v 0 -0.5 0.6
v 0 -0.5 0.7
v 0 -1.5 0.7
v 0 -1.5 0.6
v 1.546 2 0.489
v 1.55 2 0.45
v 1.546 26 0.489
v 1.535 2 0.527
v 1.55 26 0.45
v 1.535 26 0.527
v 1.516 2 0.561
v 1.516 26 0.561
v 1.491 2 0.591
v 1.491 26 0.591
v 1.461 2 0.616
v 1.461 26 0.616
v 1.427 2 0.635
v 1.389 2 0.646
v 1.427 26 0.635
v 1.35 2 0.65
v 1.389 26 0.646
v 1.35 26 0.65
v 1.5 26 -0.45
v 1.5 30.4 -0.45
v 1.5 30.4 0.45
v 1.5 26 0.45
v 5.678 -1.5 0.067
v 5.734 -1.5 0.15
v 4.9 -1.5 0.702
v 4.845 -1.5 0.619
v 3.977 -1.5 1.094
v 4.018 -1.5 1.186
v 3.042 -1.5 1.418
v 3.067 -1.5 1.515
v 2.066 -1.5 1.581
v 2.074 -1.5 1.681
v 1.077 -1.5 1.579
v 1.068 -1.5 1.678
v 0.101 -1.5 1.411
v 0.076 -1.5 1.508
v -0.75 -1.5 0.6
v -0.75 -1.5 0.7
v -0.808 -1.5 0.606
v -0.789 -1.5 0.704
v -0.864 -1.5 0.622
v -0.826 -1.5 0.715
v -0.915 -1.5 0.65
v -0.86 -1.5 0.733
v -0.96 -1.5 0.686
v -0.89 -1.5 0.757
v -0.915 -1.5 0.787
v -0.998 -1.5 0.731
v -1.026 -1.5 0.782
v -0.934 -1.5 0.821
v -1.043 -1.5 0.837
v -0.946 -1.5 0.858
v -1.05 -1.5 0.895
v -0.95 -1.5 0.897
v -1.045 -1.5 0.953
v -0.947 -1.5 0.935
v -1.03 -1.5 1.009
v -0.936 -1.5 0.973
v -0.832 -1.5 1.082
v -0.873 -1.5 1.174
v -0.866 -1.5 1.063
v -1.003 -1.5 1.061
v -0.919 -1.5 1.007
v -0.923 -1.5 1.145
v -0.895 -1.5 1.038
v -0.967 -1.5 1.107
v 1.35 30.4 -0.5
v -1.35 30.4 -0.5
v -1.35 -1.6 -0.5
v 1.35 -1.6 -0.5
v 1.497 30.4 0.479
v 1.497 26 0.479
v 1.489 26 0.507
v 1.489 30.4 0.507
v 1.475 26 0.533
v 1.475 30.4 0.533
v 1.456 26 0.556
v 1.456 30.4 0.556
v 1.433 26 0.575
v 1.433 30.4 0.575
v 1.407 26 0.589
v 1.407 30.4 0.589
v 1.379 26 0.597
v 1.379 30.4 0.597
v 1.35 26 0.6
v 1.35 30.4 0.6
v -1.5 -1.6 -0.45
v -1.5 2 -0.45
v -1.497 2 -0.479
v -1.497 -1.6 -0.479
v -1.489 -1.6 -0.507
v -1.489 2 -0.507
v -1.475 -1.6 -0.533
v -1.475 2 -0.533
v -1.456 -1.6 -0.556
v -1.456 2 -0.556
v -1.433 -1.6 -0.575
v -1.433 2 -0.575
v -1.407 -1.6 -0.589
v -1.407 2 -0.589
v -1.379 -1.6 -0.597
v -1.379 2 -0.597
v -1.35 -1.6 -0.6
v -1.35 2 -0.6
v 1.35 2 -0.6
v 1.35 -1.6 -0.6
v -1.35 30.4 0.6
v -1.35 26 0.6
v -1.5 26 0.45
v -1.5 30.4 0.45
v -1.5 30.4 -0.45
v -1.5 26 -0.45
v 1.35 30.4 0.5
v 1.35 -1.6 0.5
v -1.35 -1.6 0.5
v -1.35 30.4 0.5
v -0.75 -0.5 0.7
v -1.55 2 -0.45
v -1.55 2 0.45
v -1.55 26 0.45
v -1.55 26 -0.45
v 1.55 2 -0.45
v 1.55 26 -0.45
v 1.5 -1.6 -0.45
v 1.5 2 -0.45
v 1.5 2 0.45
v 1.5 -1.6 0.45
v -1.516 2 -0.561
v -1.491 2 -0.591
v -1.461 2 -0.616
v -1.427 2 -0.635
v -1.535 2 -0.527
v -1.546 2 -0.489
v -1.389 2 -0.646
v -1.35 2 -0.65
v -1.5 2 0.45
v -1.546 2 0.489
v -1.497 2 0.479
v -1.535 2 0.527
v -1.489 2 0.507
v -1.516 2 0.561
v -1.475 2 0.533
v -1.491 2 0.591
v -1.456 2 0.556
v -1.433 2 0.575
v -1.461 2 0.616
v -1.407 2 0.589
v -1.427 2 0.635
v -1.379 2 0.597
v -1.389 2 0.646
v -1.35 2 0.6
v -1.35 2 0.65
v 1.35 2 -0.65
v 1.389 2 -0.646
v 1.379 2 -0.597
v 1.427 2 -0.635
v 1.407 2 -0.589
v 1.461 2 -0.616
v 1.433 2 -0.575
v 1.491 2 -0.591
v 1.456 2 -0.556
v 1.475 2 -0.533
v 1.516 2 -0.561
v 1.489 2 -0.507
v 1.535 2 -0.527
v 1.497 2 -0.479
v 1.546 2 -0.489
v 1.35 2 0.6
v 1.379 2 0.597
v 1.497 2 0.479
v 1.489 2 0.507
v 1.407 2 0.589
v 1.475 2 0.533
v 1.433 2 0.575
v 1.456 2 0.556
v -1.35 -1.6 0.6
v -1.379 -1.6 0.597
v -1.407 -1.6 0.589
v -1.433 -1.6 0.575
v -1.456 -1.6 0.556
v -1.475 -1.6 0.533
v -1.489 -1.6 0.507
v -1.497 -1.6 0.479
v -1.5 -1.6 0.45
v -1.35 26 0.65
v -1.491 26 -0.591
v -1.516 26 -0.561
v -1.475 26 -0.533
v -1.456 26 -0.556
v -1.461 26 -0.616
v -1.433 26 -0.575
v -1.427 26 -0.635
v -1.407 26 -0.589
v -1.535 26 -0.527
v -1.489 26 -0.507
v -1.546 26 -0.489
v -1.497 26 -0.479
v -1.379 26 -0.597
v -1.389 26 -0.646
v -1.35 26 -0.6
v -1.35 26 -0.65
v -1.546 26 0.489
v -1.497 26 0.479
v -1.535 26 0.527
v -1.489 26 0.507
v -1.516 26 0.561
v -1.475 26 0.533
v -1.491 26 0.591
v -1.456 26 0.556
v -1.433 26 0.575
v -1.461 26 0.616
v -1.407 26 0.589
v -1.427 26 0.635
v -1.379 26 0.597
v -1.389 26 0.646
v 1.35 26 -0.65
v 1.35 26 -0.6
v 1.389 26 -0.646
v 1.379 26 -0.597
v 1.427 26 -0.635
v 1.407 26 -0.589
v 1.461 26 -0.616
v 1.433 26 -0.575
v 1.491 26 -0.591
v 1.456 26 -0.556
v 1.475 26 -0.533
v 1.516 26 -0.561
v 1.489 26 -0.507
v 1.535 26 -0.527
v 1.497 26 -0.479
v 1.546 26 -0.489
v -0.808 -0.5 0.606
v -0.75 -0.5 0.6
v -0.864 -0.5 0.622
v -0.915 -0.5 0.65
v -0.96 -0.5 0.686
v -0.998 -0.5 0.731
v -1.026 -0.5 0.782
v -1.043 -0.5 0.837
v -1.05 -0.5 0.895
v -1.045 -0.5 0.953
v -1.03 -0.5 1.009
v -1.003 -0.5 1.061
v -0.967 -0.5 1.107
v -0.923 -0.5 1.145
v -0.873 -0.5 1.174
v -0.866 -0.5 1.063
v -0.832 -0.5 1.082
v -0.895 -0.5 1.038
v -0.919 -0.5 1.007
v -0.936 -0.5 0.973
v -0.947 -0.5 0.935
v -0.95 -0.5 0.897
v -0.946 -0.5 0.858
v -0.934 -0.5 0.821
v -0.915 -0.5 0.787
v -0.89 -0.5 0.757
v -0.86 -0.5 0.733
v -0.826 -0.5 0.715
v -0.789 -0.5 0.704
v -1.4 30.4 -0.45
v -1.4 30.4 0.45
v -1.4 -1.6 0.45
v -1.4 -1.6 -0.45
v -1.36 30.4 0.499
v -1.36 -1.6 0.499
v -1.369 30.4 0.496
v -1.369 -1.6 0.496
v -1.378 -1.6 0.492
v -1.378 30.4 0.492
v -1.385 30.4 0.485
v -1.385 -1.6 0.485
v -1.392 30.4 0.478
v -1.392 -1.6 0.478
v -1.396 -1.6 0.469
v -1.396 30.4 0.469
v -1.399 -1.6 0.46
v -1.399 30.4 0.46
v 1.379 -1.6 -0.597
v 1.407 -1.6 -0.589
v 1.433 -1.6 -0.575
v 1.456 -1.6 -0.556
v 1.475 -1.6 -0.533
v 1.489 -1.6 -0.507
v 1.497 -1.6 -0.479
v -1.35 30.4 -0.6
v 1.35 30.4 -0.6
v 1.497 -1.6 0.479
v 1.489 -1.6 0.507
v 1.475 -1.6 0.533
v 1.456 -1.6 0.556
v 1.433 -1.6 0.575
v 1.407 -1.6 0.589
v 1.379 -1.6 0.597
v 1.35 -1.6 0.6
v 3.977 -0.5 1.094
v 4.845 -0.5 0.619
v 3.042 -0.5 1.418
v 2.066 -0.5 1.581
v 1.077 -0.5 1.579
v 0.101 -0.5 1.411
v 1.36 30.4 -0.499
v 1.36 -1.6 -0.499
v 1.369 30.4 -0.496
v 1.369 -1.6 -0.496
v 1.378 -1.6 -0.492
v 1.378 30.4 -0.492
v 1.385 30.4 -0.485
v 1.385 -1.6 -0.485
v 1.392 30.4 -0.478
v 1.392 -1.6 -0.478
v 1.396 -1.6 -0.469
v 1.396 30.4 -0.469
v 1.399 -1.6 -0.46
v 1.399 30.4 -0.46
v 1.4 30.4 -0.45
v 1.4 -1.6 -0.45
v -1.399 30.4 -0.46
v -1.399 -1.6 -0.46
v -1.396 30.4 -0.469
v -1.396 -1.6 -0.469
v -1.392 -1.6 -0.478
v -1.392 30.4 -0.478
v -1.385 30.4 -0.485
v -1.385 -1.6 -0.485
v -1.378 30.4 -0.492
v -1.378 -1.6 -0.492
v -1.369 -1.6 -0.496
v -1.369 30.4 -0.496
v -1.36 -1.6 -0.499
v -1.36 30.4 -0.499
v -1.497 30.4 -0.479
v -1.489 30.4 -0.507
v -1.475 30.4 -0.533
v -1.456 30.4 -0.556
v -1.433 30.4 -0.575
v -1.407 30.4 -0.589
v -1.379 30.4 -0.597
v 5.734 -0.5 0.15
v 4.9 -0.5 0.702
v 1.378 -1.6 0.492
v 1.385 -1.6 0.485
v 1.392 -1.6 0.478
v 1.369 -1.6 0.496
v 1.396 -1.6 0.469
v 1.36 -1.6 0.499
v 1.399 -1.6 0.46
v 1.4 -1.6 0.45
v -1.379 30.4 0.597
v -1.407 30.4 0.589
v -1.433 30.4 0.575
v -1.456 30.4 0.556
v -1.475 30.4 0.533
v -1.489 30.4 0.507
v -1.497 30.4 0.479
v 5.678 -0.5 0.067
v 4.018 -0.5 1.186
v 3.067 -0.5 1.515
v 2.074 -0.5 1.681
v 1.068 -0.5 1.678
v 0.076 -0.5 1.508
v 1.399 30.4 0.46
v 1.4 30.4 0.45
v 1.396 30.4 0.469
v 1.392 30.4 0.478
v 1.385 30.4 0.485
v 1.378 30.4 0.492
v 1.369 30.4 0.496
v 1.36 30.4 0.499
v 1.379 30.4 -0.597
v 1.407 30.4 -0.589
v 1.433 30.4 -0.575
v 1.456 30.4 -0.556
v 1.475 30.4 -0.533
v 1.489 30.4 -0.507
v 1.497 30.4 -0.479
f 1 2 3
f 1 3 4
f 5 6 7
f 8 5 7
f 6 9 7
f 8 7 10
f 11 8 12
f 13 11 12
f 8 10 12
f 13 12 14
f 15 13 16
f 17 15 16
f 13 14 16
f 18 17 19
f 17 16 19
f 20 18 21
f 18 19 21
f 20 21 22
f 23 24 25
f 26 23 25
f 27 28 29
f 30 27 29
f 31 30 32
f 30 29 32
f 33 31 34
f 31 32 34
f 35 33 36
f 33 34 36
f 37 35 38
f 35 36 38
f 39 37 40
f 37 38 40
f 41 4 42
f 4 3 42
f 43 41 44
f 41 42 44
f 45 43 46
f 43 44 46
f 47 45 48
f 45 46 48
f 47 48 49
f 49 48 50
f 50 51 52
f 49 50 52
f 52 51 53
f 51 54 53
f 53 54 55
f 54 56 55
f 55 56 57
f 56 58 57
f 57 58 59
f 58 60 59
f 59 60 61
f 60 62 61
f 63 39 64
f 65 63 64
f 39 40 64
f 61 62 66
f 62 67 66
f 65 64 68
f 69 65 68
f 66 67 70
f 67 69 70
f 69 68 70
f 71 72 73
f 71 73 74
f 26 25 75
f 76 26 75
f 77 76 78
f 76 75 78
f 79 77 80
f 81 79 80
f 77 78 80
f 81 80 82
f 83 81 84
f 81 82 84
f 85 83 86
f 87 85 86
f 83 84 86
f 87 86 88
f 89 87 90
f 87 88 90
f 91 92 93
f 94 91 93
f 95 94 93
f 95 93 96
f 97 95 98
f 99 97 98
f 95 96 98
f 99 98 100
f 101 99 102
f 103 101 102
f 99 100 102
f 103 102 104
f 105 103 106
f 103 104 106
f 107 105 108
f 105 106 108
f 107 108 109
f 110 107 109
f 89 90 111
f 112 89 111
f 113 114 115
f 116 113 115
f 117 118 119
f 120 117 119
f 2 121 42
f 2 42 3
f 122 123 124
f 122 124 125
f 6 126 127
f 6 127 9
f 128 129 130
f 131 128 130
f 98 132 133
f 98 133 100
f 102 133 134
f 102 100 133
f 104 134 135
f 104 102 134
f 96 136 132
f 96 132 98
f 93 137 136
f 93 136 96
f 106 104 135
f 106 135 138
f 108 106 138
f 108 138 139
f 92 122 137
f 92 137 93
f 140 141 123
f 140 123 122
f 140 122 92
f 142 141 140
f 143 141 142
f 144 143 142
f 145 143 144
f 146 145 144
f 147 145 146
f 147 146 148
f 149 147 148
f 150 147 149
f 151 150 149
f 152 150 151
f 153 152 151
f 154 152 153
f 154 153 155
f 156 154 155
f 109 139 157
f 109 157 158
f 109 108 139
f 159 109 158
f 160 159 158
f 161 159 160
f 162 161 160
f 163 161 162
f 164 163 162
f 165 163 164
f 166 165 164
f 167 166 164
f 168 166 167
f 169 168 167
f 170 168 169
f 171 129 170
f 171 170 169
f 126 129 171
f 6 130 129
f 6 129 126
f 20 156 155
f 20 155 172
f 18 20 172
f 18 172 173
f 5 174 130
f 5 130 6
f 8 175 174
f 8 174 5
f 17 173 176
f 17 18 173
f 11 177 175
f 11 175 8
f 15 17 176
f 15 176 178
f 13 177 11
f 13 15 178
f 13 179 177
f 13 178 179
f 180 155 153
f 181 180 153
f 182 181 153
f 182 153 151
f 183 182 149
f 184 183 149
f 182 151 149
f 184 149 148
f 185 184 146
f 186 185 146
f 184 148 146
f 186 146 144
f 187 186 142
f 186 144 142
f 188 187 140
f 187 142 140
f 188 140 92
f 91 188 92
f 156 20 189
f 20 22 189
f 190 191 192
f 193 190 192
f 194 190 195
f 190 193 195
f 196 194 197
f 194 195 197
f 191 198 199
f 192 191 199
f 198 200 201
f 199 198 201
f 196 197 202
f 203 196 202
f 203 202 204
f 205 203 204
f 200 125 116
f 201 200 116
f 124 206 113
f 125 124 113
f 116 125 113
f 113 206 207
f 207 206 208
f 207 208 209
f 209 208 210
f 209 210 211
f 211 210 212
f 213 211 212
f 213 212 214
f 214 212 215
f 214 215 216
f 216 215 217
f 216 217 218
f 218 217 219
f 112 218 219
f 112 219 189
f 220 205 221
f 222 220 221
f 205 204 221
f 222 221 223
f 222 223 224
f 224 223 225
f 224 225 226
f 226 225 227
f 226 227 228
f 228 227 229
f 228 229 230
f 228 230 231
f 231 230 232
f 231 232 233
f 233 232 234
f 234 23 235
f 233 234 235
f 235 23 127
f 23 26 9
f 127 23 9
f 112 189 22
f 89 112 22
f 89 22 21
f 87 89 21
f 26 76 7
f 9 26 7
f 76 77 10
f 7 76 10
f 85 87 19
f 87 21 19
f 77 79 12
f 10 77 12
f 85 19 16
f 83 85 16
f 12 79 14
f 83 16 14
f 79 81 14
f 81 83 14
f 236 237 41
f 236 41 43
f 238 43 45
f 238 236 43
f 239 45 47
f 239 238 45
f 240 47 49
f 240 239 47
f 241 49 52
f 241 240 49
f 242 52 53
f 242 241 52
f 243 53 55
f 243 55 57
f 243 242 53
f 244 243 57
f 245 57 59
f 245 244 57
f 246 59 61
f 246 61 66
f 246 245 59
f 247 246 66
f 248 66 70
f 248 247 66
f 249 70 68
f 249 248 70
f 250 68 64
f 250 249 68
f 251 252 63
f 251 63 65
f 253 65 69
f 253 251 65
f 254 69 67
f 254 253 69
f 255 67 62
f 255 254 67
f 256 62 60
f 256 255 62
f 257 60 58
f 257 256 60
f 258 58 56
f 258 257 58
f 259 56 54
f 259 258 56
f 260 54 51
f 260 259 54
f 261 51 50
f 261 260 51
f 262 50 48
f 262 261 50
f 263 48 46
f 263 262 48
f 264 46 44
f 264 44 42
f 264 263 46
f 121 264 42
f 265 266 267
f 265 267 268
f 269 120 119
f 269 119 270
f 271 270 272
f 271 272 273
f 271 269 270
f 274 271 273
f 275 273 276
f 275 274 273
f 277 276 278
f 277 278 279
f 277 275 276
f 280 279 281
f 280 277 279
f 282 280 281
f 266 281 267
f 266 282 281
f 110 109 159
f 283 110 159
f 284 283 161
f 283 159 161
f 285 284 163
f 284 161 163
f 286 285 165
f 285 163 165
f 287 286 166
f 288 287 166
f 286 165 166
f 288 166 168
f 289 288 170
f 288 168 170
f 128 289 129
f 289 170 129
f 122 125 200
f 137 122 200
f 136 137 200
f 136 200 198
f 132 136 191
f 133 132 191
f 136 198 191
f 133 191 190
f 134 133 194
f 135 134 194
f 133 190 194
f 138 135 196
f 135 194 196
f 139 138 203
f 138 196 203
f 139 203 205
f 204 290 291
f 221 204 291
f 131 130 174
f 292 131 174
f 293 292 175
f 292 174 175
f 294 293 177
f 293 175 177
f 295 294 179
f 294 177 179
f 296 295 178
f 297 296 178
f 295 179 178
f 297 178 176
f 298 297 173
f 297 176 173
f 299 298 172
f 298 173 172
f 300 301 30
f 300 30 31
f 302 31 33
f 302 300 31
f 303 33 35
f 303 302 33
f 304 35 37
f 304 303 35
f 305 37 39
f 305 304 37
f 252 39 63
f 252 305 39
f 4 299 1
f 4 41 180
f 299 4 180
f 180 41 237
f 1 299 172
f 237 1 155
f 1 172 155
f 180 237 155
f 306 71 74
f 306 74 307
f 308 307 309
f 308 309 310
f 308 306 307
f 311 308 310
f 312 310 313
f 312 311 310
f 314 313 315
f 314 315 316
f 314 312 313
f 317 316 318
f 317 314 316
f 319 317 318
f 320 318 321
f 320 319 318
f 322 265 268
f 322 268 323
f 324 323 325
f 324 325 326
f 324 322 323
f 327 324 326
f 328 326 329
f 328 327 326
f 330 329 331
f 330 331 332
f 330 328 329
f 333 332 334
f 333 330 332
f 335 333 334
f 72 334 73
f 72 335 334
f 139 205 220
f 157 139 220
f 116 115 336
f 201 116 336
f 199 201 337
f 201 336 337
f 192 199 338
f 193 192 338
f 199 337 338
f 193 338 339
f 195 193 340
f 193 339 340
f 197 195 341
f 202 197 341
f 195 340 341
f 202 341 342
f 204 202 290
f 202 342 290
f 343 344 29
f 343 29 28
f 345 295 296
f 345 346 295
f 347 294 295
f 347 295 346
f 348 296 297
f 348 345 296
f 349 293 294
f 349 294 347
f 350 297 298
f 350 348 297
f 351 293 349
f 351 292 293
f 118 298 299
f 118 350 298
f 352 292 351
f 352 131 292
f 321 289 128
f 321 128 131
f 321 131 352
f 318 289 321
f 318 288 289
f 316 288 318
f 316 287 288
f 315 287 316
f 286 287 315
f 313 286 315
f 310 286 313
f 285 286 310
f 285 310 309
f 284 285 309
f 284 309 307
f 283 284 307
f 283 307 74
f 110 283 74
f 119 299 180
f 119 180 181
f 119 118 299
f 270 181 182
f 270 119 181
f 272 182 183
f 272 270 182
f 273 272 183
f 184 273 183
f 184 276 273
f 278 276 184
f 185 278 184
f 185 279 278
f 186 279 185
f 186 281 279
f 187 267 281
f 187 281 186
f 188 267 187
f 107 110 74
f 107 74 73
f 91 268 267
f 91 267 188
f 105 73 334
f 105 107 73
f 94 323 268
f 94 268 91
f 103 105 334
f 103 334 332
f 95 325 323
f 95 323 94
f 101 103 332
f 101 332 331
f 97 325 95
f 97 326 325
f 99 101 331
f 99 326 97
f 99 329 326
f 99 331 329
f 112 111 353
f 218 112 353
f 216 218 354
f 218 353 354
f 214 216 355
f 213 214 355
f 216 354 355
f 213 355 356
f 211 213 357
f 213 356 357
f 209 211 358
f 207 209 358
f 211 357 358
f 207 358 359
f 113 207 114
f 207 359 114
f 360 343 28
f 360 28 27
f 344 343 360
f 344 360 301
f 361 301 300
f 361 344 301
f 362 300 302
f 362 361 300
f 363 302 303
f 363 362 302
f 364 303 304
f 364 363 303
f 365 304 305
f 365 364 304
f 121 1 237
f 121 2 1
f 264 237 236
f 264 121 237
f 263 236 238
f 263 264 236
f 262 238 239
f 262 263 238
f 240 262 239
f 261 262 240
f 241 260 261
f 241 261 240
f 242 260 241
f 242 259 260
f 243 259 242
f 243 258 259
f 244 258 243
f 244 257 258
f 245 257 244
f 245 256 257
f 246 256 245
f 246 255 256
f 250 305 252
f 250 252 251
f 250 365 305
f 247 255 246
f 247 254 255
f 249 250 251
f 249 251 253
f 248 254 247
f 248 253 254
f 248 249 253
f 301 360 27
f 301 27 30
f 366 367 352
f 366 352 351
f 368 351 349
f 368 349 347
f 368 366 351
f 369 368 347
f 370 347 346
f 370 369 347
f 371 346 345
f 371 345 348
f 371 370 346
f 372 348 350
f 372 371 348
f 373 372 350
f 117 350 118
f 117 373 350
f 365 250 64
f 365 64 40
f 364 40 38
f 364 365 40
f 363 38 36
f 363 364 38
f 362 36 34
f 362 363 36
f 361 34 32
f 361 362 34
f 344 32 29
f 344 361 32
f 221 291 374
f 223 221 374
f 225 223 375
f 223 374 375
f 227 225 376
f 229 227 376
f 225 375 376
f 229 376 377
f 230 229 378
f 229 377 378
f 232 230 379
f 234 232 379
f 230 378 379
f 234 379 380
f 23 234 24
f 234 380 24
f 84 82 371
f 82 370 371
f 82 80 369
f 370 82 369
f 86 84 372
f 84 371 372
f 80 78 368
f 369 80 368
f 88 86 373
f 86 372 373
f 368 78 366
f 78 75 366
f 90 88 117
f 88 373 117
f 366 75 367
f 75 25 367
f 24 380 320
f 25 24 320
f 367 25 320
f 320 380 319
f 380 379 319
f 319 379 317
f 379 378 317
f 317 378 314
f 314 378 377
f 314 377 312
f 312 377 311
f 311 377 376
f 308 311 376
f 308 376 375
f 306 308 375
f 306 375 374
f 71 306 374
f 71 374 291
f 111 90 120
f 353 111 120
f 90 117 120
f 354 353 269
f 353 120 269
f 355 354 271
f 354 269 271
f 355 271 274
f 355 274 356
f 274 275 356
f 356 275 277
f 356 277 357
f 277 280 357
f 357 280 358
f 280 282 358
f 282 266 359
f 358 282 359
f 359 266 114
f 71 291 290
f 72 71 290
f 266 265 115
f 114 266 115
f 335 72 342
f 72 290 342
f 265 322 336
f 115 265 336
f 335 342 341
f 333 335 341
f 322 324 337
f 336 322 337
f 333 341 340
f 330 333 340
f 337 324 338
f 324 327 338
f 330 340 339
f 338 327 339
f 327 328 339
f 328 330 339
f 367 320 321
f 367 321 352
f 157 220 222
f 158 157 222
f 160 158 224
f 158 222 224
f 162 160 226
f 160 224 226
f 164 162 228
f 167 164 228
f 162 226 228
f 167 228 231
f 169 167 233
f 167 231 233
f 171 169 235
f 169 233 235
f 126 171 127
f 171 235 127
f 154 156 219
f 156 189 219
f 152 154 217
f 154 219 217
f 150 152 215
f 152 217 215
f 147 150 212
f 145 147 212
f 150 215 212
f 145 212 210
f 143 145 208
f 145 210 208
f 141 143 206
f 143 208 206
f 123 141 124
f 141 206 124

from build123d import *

# Parameters (mm, degrees)
EXTRUDE_THIN1_DEPTH      = 30.4
EXTRUDE_THIN1_DEPTH_BACK = 1.6
EXTRUDE_THIN2_DEPTH      = 12
EXTRUDE_THIN3_DEPTH      = 1


with BuildPart() as part:
    # Sketch1 → Extrude-Thin1 (new body, two sides)
    with BuildSketch(Plane(origin=(0, 0, 0), x_dir=(1, 0, 0), z_dir=(0, 1, 0))) as extrude_thin1_sk:
        with BuildLine():
            Line((1.35, -0.6), (-1.35, -0.6))
            ThreePointArc((-1.35, -0.6), (-1.456066017, -0.556066017), (-1.5, -0.45))
            Line((-1.5, -0.45), (-1.5, 0.45))
            ThreePointArc((-1.5, 0.45), (-1.456066017, 0.556066017), (-1.35, 0.6))
            Line((-1.35, 0.6), (1.35, 0.6))
            ThreePointArc((1.35, 0.6), (1.456066017, 0.556066017), (1.5, 0.45))
            Line((1.5, 0.45), (1.5, -0.45))
            ThreePointArc((1.5, -0.45), (1.456066017, -0.556066017), (1.35, -0.6))
        make_face()
        with BuildLine():
            Line((1.35, -0.5), (-1.35, -0.5))
            ThreePointArc((-1.35, -0.5), (-1.385355339, -0.485355339), (-1.4, -0.45))
            Line((-1.4, -0.45), (-1.4, 0.45))
            ThreePointArc((-1.4, 0.45), (-1.385355339, 0.485355339), (-1.35, 0.5))
            Line((-1.35, 0.5), (1.35, 0.5))
            ThreePointArc((1.35, 0.5), (1.385355339, 0.485355339), (1.4, 0.45))
            Line((1.4, 0.45), (1.4, -0.45))
            ThreePointArc((1.4, -0.45), (1.385355339, -0.485355339), (1.35, -0.5))
        make_face(mode=Mode.SUBTRACT)
    extrude(amount=EXTRUDE_THIN1_DEPTH)
    extrude(extrude_thin1_sk.sketch, amount=-EXTRUDE_THIN1_DEPTH_BACK)

    # Sketch2 → Extrude-Thin2 (add, symmetric)
    with BuildSketch(Plane(origin=(0, 14, 0), x_dir=(-1, 0, 0), z_dir=(0, 1, 0))):
        with BuildLine():
            Line((-1.55, -0.45), (-1.55, 0.45))
            ThreePointArc((-1.55, 0.45), (-1.491421356, 0.591421356), (-1.35, 0.65))
            Line((-1.35, 0.65), (1.35, 0.65))
            ThreePointArc((1.35, 0.65), (1.491421356, 0.591421356), (1.55, 0.45))
            Line((1.55, 0.45), (1.55, -0.45))
            ThreePointArc((1.55, -0.45), (1.491421356, -0.591421356), (1.35, -0.65))
            Line((1.35, -0.65), (-1.35, -0.65))
            ThreePointArc((-1.35, -0.65), (-1.491421356, -0.591421356), (-1.55, -0.45))
        make_face()
        with BuildLine():
            Line((-1.5, -0.45), (-1.5, 0.45))
            ThreePointArc((-1.5, 0.45), (-1.456066017, 0.556066017), (-1.35, 0.6))
            Line((-1.35, 0.6), (1.35, 0.6))
            ThreePointArc((1.35, 0.6), (1.456066017, 0.556066017), (1.5, 0.45))
            Line((1.5, 0.45), (1.5, -0.45))
            ThreePointArc((1.5, -0.45), (1.456066017, -0.556066017), (1.35, -0.6))
            Line((1.35, -0.6), (-1.35, -0.6))
            ThreePointArc((-1.35, -0.6), (-1.456066017, -0.556066017), (-1.5, -0.45))
        make_face(mode=Mode.SUBTRACT)
    extrude(amount=EXTRUDE_THIN2_DEPTH, both=True)

    # Sketch3 → Extrude-Thin3 (add)
    with BuildSketch(Plane.XZ.offset(0.5)):
        with BuildLine():
            Line((0, 0.6), (-0.75, 0.6))
            ThreePointArc((-0.75, 0.6), (-1.043338791, 0.837132251), (-0.872943663, 1.173650974))
            ThreePointArc((-0.872943663, 1.173650974), (2.074168878, 1.680733699), (4.9, 0.702324945))
            Line((4.9, 0.702324945), (5.733615576, 0.149979879))
            Line((5.733615576, 0.149979879), (5.678381069, 0.066618321))
            Line((5.678381069, 0.066618321), (4.844765493, 0.618963387))
            ThreePointArc((4.844765493, 0.618963387), (2.066031557, 1.581065329), (-0.831962442, 1.082433983))
            ThreePointArc((-0.831962442, 1.082433983), (-0.945559194, 0.858088167), (-0.75, 0.7))
            Line((-0.75, 0.7), (0, 0.7))
            Line((0, 0.7), (0, 0.6))
        make_face()
    extrude(amount=EXTRUDE_THIN3_DEPTH)


solid = part.part
